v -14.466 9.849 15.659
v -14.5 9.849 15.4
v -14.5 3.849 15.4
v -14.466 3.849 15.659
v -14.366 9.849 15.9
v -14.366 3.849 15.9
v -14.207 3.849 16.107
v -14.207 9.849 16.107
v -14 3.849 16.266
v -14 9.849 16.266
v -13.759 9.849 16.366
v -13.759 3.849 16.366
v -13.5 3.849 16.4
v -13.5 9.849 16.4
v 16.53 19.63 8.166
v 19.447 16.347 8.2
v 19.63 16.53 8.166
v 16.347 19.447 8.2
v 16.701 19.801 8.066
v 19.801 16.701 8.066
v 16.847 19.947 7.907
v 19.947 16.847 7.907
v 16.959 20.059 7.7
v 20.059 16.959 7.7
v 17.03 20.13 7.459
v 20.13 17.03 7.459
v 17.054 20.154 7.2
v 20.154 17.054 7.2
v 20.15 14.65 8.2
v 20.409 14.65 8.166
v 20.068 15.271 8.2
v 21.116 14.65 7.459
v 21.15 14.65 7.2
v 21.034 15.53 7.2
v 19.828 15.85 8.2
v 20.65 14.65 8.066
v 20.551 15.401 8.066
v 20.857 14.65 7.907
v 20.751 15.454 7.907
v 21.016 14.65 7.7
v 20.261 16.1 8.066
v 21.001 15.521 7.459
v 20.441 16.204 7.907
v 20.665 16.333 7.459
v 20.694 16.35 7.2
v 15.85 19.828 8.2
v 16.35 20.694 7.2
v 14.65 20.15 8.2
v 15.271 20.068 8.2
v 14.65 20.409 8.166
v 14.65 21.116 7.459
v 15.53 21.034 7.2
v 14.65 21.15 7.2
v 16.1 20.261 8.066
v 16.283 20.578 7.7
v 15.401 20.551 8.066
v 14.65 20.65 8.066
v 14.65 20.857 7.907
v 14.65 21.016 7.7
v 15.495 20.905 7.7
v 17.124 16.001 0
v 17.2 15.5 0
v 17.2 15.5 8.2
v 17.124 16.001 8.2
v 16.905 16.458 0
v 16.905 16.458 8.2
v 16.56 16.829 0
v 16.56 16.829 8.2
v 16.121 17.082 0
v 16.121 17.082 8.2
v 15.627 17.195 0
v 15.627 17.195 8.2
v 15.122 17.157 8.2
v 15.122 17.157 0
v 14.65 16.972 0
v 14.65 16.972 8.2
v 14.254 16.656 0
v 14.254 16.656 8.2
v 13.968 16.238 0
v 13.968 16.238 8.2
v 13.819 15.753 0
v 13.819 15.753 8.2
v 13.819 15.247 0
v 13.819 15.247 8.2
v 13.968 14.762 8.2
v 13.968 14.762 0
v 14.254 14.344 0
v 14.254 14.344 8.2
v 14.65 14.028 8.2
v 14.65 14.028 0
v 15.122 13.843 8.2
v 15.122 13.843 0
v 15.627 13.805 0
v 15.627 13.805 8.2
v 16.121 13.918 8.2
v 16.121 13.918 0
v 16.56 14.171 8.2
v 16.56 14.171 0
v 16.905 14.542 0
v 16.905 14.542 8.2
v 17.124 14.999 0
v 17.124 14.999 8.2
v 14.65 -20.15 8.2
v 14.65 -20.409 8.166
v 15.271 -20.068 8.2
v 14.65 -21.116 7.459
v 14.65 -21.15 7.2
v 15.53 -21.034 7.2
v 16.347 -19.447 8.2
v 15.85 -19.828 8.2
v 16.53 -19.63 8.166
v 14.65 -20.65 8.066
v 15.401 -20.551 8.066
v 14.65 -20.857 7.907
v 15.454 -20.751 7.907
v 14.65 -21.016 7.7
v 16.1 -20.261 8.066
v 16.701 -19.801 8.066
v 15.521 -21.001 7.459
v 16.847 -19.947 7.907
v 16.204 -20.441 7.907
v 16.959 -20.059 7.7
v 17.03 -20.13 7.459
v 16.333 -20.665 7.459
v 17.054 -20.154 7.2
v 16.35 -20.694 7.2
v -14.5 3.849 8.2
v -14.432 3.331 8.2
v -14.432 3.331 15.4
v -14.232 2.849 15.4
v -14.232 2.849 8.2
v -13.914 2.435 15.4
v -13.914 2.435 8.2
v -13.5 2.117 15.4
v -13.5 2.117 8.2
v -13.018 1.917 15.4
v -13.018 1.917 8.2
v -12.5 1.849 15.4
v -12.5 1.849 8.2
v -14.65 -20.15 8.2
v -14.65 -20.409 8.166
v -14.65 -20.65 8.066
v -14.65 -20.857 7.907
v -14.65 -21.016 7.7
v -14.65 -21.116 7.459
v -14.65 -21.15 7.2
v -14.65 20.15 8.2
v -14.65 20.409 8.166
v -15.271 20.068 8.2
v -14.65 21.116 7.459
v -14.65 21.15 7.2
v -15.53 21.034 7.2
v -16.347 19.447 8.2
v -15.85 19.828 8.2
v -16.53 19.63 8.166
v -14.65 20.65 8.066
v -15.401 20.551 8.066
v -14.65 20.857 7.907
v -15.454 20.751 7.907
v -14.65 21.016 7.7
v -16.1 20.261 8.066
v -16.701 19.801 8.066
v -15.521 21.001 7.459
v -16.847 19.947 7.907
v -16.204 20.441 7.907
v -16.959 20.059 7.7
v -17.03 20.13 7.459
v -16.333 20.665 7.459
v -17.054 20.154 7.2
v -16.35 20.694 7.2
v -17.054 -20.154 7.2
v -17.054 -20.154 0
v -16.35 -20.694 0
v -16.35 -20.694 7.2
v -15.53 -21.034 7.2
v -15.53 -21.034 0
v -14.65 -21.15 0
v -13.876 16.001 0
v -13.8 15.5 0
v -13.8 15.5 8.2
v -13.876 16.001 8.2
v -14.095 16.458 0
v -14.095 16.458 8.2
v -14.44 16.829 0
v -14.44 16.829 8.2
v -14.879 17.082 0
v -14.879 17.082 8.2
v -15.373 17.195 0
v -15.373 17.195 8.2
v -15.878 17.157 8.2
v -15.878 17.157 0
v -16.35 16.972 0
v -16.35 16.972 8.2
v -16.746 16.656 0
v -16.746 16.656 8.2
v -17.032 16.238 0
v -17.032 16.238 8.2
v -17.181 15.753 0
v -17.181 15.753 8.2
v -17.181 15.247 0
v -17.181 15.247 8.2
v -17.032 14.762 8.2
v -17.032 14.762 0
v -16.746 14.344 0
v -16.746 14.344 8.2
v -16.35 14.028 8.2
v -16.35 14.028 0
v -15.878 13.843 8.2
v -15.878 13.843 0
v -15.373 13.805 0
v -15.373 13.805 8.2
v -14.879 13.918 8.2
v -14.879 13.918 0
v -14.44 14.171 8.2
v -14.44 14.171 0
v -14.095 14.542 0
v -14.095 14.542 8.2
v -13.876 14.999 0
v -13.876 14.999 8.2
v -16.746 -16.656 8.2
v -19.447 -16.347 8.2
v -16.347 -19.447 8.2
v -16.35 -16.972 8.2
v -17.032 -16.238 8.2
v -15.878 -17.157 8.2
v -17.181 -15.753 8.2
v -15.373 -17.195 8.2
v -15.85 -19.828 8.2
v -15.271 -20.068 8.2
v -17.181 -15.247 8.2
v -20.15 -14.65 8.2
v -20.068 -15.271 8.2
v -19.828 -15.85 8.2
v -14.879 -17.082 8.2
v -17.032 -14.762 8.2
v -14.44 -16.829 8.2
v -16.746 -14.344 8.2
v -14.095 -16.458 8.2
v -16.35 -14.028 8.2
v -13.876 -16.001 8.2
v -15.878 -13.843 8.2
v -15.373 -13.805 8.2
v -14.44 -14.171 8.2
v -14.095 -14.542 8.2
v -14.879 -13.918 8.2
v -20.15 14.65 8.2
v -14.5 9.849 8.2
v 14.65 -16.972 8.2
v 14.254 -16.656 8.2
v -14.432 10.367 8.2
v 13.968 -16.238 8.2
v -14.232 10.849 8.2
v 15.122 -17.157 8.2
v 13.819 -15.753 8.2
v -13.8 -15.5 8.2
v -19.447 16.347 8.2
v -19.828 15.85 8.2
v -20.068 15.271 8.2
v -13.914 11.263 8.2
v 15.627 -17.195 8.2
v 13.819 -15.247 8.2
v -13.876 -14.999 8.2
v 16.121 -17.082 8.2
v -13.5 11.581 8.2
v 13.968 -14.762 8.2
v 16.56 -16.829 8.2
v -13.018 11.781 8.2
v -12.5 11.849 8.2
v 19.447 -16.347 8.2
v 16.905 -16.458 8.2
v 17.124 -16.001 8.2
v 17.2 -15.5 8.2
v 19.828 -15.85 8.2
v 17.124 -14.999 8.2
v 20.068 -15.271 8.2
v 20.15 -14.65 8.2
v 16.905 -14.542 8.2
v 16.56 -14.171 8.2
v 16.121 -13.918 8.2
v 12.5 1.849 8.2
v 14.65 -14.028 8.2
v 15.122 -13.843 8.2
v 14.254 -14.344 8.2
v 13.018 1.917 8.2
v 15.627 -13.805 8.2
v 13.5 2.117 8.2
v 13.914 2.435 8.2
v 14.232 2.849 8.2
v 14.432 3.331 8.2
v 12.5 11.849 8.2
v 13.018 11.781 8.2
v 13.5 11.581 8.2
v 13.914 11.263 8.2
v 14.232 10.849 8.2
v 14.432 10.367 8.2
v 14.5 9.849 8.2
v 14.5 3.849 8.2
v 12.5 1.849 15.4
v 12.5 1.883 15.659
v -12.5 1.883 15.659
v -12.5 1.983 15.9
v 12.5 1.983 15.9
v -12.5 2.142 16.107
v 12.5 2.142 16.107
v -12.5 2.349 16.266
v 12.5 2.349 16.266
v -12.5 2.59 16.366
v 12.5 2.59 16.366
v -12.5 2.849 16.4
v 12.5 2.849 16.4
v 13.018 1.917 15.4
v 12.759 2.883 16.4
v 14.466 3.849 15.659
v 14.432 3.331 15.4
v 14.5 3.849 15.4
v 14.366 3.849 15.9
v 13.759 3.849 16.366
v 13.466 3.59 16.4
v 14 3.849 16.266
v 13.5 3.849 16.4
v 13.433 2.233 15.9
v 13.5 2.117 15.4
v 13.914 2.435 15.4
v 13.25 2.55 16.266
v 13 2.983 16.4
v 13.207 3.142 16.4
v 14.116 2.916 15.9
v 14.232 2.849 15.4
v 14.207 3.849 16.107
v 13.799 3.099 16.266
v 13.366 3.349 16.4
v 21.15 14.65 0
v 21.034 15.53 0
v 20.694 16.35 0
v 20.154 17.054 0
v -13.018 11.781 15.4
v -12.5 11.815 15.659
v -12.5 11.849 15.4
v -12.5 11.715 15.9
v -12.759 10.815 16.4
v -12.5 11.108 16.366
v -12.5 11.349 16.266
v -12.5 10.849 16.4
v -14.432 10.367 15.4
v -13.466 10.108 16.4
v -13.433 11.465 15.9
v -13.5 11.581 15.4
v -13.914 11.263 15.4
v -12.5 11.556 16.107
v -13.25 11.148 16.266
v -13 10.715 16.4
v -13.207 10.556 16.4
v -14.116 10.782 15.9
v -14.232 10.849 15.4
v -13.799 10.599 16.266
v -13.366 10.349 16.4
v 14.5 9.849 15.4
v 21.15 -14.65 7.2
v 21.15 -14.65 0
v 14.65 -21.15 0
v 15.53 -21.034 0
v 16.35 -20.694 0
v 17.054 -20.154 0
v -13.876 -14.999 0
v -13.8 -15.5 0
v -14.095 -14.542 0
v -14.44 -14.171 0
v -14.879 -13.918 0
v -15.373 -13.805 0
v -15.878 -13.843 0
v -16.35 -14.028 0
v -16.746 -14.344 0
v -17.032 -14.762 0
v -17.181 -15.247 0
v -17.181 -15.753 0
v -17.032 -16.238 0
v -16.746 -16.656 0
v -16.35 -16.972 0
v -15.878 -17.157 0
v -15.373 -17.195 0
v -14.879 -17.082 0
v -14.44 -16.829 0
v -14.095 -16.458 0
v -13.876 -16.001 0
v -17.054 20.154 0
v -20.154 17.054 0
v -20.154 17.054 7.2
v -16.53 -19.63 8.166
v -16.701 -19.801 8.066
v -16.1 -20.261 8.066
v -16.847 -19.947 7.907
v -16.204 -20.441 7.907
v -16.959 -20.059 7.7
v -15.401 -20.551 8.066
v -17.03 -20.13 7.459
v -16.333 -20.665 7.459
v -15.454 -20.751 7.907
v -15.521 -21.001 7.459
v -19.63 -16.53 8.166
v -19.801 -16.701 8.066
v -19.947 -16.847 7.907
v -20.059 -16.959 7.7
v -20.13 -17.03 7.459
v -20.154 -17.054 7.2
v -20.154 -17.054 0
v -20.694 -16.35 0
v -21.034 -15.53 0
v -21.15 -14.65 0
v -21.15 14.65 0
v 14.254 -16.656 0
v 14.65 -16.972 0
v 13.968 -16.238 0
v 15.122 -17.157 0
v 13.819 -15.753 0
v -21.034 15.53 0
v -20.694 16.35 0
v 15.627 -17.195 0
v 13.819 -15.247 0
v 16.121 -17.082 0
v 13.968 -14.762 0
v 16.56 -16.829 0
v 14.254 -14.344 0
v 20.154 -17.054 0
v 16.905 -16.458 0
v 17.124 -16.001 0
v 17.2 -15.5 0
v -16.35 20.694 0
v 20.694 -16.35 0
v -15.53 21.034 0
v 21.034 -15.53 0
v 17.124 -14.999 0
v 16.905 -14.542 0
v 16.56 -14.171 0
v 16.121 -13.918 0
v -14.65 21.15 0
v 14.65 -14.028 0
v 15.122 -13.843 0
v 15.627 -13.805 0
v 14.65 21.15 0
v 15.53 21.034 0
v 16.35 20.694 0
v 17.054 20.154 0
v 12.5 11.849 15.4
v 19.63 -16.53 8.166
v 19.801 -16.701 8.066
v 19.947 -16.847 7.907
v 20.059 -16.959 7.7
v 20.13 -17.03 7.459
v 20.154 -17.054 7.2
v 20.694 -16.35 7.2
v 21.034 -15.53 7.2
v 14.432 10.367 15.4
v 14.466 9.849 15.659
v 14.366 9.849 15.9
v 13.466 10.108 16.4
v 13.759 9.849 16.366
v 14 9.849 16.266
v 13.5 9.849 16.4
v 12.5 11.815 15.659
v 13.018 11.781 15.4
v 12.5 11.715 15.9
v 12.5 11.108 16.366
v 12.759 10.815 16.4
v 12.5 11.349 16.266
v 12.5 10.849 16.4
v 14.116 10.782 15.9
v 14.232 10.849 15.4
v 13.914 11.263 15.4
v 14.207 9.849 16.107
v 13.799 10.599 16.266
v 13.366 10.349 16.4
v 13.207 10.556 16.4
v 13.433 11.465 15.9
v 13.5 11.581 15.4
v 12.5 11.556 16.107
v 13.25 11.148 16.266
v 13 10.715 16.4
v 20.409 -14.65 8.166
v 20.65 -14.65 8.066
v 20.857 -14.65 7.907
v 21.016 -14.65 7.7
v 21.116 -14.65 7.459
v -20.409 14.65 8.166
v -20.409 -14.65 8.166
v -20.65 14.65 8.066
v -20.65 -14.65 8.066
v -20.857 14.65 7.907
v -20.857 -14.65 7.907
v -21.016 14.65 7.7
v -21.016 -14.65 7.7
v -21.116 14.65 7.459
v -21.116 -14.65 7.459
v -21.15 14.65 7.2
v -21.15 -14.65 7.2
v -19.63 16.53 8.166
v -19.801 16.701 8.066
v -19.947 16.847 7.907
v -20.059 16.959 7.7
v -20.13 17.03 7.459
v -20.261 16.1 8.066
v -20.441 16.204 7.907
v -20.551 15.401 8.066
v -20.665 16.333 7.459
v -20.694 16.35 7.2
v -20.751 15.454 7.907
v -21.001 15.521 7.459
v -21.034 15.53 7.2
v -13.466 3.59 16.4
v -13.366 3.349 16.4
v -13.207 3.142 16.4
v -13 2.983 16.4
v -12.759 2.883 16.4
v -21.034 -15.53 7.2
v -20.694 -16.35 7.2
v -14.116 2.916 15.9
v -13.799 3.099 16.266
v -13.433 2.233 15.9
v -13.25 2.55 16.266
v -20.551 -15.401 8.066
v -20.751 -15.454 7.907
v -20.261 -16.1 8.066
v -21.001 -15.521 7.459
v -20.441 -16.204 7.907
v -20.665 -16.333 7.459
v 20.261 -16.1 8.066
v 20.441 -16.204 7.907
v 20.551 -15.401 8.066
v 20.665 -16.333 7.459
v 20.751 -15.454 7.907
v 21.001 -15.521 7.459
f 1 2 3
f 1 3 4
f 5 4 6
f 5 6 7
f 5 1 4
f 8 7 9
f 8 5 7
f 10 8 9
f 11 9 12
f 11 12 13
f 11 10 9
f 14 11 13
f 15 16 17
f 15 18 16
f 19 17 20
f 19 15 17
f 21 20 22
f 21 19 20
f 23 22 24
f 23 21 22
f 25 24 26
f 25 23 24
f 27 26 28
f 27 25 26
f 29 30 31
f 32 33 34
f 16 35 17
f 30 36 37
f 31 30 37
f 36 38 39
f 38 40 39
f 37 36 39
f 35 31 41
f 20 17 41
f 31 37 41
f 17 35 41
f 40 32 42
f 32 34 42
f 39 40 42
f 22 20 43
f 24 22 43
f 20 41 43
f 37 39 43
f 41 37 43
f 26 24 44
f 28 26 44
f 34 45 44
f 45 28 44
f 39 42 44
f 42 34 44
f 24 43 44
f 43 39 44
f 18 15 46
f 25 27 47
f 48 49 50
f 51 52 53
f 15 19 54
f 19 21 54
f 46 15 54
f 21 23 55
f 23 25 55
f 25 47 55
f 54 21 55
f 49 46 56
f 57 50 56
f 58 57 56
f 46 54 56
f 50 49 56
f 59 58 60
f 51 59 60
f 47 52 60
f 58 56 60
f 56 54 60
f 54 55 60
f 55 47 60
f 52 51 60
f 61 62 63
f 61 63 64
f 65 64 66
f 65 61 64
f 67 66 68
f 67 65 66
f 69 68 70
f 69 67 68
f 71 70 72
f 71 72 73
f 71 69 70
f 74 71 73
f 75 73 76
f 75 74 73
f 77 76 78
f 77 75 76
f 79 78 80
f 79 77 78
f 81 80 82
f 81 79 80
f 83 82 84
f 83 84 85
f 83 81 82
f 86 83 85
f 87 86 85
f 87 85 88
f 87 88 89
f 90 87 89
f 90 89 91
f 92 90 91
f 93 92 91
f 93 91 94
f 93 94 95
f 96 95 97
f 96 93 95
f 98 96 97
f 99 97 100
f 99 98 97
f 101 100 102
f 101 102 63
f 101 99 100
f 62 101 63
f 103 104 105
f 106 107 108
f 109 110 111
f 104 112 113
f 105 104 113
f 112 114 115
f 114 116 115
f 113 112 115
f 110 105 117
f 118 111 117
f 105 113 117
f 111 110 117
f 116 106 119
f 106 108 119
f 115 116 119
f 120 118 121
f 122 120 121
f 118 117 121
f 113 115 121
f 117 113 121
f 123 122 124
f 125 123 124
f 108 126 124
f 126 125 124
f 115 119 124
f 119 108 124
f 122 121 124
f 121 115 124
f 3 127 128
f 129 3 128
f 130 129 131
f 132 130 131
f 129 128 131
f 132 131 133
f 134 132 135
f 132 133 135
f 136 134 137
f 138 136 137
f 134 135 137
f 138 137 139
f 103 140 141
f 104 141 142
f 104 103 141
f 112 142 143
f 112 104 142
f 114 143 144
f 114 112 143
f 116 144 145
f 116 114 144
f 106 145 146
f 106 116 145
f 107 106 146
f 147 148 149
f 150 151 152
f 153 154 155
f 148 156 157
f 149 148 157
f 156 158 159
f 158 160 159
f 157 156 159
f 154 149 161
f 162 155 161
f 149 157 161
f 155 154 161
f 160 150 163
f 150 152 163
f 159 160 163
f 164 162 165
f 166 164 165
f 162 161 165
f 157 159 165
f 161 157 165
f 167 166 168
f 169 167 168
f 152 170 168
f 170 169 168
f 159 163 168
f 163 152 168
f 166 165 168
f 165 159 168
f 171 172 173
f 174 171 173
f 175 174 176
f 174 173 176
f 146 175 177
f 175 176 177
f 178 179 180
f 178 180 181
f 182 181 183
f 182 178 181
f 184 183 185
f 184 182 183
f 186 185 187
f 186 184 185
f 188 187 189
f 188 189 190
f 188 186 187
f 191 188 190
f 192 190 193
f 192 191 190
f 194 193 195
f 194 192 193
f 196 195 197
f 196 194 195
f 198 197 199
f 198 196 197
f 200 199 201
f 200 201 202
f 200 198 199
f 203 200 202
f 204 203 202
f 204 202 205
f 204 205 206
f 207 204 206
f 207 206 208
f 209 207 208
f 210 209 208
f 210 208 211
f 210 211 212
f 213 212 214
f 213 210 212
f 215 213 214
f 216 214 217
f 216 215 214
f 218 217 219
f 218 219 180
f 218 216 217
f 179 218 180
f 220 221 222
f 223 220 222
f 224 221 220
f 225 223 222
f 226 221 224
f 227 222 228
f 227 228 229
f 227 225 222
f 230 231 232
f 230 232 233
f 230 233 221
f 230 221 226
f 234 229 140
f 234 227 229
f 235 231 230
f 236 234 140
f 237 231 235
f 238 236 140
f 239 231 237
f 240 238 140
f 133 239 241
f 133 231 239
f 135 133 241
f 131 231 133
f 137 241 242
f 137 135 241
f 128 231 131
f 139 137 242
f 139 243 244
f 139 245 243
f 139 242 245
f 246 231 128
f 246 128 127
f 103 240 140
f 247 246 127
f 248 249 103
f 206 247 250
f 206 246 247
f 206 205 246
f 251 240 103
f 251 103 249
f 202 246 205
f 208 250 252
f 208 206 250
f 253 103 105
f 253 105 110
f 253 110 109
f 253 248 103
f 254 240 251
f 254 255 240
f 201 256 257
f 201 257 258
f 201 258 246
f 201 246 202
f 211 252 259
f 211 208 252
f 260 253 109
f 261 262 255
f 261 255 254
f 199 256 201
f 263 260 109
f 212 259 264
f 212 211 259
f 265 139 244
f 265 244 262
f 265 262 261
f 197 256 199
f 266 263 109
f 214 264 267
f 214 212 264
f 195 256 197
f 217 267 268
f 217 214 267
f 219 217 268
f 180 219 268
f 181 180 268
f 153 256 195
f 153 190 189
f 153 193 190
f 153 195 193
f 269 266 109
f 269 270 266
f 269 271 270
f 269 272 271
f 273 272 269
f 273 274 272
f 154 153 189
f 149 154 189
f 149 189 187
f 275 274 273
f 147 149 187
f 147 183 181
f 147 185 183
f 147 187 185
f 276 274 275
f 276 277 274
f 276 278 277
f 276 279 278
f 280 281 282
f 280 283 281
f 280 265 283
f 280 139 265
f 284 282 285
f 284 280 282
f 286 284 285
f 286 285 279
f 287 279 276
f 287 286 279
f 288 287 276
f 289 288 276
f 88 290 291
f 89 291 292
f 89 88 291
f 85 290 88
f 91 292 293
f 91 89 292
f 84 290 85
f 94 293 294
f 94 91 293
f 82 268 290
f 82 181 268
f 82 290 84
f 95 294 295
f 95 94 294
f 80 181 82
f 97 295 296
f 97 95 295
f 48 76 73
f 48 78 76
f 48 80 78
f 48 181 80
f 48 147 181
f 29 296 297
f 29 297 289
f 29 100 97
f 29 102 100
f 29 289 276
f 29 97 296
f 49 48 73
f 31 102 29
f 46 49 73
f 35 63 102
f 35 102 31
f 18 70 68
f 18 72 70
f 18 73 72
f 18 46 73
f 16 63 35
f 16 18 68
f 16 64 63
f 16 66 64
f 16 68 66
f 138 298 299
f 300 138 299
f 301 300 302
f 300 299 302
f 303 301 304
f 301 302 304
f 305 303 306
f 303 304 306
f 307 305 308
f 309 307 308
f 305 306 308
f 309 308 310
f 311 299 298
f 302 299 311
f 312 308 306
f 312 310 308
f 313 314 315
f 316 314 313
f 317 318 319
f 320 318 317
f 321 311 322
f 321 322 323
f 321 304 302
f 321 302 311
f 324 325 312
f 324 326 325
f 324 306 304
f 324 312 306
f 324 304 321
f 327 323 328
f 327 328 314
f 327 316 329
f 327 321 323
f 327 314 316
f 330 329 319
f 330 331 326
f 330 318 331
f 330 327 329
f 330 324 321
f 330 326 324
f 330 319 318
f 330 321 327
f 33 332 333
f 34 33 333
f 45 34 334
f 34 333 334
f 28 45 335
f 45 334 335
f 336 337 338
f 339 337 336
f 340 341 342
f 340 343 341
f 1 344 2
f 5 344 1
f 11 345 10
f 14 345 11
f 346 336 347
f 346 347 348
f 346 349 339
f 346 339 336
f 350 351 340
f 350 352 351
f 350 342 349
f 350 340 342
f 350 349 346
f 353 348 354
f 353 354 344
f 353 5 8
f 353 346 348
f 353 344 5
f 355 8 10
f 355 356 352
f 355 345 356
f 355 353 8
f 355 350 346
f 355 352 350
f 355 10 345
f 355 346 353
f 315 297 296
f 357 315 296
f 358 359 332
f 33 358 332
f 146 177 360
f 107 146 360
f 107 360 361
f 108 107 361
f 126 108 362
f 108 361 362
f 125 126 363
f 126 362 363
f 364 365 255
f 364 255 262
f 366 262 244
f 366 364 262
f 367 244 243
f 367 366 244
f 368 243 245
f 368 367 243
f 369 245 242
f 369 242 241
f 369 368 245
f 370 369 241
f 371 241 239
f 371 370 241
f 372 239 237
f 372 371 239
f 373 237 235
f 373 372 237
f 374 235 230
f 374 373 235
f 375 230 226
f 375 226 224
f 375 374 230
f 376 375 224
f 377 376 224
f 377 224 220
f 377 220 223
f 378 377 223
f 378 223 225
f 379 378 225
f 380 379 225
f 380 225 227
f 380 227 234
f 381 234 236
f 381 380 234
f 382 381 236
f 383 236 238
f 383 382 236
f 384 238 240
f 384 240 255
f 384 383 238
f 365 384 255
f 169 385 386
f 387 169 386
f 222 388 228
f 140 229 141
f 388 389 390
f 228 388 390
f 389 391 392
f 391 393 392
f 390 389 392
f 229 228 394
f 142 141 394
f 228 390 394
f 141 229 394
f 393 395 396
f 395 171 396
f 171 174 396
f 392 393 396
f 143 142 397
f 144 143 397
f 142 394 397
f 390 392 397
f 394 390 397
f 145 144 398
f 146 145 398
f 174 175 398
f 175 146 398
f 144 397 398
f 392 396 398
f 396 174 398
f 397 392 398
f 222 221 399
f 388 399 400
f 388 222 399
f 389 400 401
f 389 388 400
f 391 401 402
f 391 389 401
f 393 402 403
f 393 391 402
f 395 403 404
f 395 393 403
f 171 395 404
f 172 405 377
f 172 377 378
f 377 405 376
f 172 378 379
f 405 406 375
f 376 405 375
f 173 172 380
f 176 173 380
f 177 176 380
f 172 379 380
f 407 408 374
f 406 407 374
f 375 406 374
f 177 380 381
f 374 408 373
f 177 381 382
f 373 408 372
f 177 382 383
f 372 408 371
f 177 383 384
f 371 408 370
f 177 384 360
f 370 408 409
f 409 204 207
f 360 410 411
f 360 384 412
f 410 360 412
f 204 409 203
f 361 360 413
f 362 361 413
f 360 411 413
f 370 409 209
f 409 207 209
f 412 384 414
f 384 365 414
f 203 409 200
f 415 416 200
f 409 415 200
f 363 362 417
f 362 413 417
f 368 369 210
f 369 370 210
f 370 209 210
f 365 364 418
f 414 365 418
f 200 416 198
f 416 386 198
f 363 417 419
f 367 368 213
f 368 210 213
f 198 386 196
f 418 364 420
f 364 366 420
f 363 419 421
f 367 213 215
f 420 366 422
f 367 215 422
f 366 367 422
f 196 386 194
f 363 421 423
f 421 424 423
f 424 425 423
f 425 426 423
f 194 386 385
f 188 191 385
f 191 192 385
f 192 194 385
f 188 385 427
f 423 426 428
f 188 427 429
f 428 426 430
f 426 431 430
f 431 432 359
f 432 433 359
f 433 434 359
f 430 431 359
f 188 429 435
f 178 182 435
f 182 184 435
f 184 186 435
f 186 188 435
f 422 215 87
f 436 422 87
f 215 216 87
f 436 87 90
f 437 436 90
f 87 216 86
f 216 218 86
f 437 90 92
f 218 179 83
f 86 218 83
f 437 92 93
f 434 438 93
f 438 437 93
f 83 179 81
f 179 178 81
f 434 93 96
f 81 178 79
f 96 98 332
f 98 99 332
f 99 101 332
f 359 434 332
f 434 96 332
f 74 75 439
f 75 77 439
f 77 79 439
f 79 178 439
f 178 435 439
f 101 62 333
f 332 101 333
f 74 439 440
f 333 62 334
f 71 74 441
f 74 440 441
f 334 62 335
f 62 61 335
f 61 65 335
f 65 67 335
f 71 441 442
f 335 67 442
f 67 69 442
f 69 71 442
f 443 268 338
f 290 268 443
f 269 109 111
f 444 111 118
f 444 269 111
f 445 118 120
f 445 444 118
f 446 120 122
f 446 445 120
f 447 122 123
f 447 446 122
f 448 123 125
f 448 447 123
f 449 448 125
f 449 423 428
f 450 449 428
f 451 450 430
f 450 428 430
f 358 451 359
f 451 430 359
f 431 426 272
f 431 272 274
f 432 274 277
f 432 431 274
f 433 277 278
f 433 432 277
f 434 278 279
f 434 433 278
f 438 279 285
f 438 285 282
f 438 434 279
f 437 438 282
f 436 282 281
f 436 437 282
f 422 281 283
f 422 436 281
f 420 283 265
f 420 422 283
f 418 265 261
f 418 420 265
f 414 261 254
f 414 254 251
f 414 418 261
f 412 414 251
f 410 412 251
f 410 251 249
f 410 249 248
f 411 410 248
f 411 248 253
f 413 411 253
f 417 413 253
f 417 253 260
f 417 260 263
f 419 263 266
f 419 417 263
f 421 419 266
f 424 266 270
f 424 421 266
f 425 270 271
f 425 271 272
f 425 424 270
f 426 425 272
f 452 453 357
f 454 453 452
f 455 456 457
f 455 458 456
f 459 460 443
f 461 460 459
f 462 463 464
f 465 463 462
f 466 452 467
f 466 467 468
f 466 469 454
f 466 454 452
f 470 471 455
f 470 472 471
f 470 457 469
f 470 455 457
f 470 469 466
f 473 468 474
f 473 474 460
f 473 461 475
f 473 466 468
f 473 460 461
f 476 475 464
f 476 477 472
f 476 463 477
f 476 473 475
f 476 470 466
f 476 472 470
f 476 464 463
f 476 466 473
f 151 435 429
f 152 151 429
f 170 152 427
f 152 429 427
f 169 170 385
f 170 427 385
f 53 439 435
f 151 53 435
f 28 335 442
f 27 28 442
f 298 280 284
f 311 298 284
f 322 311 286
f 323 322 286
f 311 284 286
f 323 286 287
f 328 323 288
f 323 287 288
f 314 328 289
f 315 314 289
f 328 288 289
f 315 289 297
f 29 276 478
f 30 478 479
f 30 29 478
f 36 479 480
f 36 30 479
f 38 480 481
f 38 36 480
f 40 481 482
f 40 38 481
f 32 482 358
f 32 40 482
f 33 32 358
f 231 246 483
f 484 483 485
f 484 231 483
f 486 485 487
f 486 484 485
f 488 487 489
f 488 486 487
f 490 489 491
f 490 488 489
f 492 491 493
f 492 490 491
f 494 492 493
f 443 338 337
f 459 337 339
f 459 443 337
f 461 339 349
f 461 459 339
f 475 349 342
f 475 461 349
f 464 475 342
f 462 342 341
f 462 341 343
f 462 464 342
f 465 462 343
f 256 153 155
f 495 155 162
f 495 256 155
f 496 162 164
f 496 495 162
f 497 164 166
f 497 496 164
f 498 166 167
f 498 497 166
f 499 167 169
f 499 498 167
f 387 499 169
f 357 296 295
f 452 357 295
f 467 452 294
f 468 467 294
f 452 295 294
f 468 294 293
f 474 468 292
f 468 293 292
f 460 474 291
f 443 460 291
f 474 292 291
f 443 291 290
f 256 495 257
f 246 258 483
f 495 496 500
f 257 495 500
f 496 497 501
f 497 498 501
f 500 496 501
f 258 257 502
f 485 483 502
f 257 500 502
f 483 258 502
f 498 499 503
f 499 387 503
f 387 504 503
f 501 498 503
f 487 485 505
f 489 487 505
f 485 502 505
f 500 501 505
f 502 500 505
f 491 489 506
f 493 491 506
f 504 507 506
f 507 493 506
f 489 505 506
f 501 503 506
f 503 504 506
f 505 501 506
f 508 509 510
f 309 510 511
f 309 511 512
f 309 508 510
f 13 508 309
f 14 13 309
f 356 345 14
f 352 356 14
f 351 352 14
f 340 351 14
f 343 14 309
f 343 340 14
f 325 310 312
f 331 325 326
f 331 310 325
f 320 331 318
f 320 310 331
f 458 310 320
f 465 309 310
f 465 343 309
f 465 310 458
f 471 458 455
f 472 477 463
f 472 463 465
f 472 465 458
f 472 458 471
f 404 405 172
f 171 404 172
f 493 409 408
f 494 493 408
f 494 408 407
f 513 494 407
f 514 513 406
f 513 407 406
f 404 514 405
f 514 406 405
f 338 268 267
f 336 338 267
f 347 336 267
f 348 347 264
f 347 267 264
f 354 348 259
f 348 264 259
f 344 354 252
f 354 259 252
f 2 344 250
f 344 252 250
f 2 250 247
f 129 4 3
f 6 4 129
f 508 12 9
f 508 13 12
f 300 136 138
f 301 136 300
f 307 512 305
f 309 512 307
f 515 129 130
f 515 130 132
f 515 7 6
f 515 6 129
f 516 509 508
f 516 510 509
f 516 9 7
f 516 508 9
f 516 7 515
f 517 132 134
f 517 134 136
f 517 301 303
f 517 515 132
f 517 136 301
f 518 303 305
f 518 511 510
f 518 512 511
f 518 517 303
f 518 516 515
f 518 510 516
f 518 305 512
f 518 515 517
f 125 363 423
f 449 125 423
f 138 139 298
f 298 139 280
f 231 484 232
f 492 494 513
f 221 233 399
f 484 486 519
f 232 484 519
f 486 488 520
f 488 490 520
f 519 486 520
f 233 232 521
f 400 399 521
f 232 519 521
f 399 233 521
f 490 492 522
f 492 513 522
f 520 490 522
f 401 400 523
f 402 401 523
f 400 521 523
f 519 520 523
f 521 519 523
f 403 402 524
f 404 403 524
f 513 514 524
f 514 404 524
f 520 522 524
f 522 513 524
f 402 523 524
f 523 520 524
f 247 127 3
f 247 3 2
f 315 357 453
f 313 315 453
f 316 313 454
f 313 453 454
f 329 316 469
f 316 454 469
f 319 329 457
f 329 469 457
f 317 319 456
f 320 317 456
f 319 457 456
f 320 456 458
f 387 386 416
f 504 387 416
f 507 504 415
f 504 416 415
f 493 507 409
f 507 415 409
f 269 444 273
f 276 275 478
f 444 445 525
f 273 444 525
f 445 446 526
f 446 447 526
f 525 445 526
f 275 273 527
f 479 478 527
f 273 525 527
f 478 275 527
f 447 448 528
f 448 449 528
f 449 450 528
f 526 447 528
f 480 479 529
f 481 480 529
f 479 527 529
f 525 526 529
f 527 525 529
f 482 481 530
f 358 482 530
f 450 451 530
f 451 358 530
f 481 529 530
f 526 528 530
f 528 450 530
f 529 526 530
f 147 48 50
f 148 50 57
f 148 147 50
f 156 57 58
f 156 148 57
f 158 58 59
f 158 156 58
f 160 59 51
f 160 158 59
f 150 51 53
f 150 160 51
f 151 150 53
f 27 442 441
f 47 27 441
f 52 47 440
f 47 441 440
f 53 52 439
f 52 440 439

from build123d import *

# Parameters (mm, degrees)
SKETCH1_R           = 1.7
BOSS_EXTRUDE1_DEPTH = 8.2
SKETCH2_W           = 29
SKETCH2_H           = 10
BOSS_EXTRUDE2_DEPTH = 8.2
FILLET2_R           = 1
FILLET3_R           = 2


with BuildPart() as part:
    # Sketch1 → Boss-Extrude1 (new body)
    with BuildSketch(Plane.XY):
        with BuildLine():
            Line((-21.15, 14.65), (-21.15, -14.65))
            ThreePointArc((-21.15, -14.65), (-20.891190411, -15.95112367), (-20.154163056, -17.054163056))
            Line((-20.154163056, -17.054163056), (-17.054163056, -20.154163056))
            ThreePointArc((-17.054163056, -20.154163056), (-15.95112367, -20.891190411), (-14.65, -21.15))
            Line((-14.65, -21.15), (14.65, -21.15))
            ThreePointArc((14.65, -21.15), (15.95112367, -20.891190411), (17.054163056, -20.154163056))
            Line((17.054163056, -20.154163056), (20.154163056, -17.054163056))
            ThreePointArc((20.154163056, -17.054163056), (20.891190411, -15.95112367), (21.15, -14.65))
            Line((21.15, -14.65), (21.15, 14.65))
            ThreePointArc((21.15, 14.65), (20.891190411, 15.95112367), (20.154163056, 17.054163056))
            Line((20.154163056, 17.054163056), (17.054163056, 20.154163056))
            ThreePointArc((17.054163056, 20.154163056), (15.95112367, 20.891190411), (14.65, 21.15))
            Line((14.65, 21.15), (-14.65, 21.15))
            ThreePointArc((-14.65, 21.15), (-15.95112367, 20.891190411), (-17.054163056, 20.154163056))
            Line((-17.054163056, 20.154163056), (-20.154163056, 17.054163056))
            ThreePointArc((-20.154163056, 17.054163056), (-20.891190411, 15.95112367), (-21.15, 14.65))
        make_face()
        with Locations((-15.5, 15.5)):
            Circle(SKETCH1_R, mode=Mode.SUBTRACT)
        with Locations((15.5, 15.5)):
            Circle(SKETCH1_R, mode=Mode.SUBTRACT)
        with Locations((15.5, -15.5)):
            Circle(SKETCH1_R, mode=Mode.SUBTRACT)
        with Locations((-15.5, -15.5)):
            Circle(SKETCH1_R, mode=Mode.SUBTRACT)
    extrude(amount=BOSS_EXTRUDE1_DEPTH)

    # Sketch2 → Boss-Extrude2 (add)
    with BuildSketch(Plane.XY.offset(8.2)):
        with Locations((0, 6.849045043)):
            Rectangle(SKETCH2_W, SKETCH2_H)
    extrude(amount=BOSS_EXTRUDE2_DEPTH)

    # Fillet2
    fillet2_edges = [part.edges().sort_by_distance(p)[0] for p in [
        (15.95112367, 20.891190411, 8.2),
        (0, 21.15, 8.2),
        (-15.95112367, 20.891190411, 8.2),
        (-18.604163056, 18.604163056, 8.2),
        (-20.891190411, 15.95112367, 8.2),
        (-21.15, 0, 8.2),
        (-20.891190411, -15.95112367, 8.2),
        (-18.604163056, -18.604163056, 8.2),
        (-15.95112367, -20.891190411, 8.2),
        (0, -21.15, 8.2),
        (20.891190411, 15.95112367, 8.2),
        (15.95112367, -20.891190411, 8.2),
        (18.604163056, -18.604163056, 8.2),
        (20.891190411, -15.95112367, 8.2),
        (21.15, 0, 8.2),
        (-14.5, 6.849045043, 16.4),
        (0, 1.849045043, 16.4),
        (14.5, 6.849045043, 16.4),
        (0, 11.849045043, 16.4),
        (18.604163056, 18.604163056, 8.2),
    ]]
    fillet(fillet2_edges, radius=FILLET2_R)

    # Fillet3
    # the kernel refuses this fillet: 2 mm, written as the material it takes off along each edge
    with BuildSketch(Plane(origin=(12.5, 3.849045043, 16.4), x_dir=(0, -1, 0), z_dir=(-1, 0, 0))) as fillet3_piece_1:
        with BuildLine():
            CenterArc((1, -1), 1, 0, 90)
            Line((2, -1), (2, 0))
            Line((2, 0), (1, 0))
        make_face()
    revolve(axis=Axis((12.5, 3.849045043, 16.4), (0, 0, 1)), revolution_arc=90, mode=Mode.SUBTRACT)
    with BuildSketch(Plane(origin=(-12.5, 3.849045043, 16.4), x_dir=(-1, 0, 0), z_dir=(0, 1, 0))) as fillet3_piece_2:
        with BuildLine():
            CenterArc((1, -1), 1, 0, 90)
            Line((2, -1), (2, 0))
            Line((2, 0), (1, 0))
        make_face()
    revolve(axis=Axis((-12.5, 3.849045043, 16.4), (0, 0, 1)), revolution_arc=90, mode=Mode.SUBTRACT)
    with BuildSketch(Plane(origin=(12.5, 9.849045043, 16.4), x_dir=(1, 0, 0), z_dir=(0, -1, 0))) as fillet3_piece_3:
        with BuildLine():
            CenterArc((1, -1), 1, 0, 90)
            Line((2, -1), (2, 0))
            Line((2, 0), (1, 0))
        make_face()
    revolve(axis=Axis((12.5, 9.849045043, 16.4), (0, 0, 1)), revolution_arc=90, mode=Mode.SUBTRACT)
    with BuildSketch(Plane(origin=(-12.5, 9.849045043, 16.4), x_dir=(0, 1, 0), z_dir=(1, 0, 0))) as fillet3_piece_4:
        with BuildLine():
            CenterArc((1, -1), 1, 0, 90)
            Line((2, -1), (2, 0))
            Line((2, 0), (1, 0))
        make_face()
    revolve(axis=Axis((-12.5, 9.849045043, 16.4), (0, 0, 1)), revolution_arc=90, mode=Mode.SUBTRACT)
    with BuildSketch(Plane(origin=(-14.5, 11.849045043, 8.2), x_dir=(0, -1, 0), z_dir=(0, 0, 1))) as fillet3_piece_5:
        with BuildLine():
            CenterArc((FILLET3_R, FILLET3_R), FILLET3_R, 180, 90)
            Line((0, FILLET3_R), (0, 0))
            Line((0, 0), (FILLET3_R, 0))
        make_face()
    extrude(amount=8.2, mode=Mode.SUBTRACT)
    with BuildSketch(Plane(origin=(14.5, 11.849045043, 8.2), x_dir=(0, -1, 0), z_dir=(0, 0, 1)), Plane(origin=(14.5, 1.849045043, 8.2), x_dir=(-1, 0, 0), z_dir=(0, 0, 1)), Plane(origin=(-14.5, 1.849045043, 8.2), x_dir=(0, 1, 0), z_dir=(0, 0, 1))) as fillet3_piece_6:
        with BuildLine():
            CenterArc((FILLET3_R, -FILLET3_R), FILLET3_R, 90, 90)
            Line((0, -FILLET3_R), (0, 0))
            Line((0, 0), (FILLET3_R, 0))
        make_face()
    extrude(amount=8.2, mode=Mode.SUBTRACT)


solid = part.part
